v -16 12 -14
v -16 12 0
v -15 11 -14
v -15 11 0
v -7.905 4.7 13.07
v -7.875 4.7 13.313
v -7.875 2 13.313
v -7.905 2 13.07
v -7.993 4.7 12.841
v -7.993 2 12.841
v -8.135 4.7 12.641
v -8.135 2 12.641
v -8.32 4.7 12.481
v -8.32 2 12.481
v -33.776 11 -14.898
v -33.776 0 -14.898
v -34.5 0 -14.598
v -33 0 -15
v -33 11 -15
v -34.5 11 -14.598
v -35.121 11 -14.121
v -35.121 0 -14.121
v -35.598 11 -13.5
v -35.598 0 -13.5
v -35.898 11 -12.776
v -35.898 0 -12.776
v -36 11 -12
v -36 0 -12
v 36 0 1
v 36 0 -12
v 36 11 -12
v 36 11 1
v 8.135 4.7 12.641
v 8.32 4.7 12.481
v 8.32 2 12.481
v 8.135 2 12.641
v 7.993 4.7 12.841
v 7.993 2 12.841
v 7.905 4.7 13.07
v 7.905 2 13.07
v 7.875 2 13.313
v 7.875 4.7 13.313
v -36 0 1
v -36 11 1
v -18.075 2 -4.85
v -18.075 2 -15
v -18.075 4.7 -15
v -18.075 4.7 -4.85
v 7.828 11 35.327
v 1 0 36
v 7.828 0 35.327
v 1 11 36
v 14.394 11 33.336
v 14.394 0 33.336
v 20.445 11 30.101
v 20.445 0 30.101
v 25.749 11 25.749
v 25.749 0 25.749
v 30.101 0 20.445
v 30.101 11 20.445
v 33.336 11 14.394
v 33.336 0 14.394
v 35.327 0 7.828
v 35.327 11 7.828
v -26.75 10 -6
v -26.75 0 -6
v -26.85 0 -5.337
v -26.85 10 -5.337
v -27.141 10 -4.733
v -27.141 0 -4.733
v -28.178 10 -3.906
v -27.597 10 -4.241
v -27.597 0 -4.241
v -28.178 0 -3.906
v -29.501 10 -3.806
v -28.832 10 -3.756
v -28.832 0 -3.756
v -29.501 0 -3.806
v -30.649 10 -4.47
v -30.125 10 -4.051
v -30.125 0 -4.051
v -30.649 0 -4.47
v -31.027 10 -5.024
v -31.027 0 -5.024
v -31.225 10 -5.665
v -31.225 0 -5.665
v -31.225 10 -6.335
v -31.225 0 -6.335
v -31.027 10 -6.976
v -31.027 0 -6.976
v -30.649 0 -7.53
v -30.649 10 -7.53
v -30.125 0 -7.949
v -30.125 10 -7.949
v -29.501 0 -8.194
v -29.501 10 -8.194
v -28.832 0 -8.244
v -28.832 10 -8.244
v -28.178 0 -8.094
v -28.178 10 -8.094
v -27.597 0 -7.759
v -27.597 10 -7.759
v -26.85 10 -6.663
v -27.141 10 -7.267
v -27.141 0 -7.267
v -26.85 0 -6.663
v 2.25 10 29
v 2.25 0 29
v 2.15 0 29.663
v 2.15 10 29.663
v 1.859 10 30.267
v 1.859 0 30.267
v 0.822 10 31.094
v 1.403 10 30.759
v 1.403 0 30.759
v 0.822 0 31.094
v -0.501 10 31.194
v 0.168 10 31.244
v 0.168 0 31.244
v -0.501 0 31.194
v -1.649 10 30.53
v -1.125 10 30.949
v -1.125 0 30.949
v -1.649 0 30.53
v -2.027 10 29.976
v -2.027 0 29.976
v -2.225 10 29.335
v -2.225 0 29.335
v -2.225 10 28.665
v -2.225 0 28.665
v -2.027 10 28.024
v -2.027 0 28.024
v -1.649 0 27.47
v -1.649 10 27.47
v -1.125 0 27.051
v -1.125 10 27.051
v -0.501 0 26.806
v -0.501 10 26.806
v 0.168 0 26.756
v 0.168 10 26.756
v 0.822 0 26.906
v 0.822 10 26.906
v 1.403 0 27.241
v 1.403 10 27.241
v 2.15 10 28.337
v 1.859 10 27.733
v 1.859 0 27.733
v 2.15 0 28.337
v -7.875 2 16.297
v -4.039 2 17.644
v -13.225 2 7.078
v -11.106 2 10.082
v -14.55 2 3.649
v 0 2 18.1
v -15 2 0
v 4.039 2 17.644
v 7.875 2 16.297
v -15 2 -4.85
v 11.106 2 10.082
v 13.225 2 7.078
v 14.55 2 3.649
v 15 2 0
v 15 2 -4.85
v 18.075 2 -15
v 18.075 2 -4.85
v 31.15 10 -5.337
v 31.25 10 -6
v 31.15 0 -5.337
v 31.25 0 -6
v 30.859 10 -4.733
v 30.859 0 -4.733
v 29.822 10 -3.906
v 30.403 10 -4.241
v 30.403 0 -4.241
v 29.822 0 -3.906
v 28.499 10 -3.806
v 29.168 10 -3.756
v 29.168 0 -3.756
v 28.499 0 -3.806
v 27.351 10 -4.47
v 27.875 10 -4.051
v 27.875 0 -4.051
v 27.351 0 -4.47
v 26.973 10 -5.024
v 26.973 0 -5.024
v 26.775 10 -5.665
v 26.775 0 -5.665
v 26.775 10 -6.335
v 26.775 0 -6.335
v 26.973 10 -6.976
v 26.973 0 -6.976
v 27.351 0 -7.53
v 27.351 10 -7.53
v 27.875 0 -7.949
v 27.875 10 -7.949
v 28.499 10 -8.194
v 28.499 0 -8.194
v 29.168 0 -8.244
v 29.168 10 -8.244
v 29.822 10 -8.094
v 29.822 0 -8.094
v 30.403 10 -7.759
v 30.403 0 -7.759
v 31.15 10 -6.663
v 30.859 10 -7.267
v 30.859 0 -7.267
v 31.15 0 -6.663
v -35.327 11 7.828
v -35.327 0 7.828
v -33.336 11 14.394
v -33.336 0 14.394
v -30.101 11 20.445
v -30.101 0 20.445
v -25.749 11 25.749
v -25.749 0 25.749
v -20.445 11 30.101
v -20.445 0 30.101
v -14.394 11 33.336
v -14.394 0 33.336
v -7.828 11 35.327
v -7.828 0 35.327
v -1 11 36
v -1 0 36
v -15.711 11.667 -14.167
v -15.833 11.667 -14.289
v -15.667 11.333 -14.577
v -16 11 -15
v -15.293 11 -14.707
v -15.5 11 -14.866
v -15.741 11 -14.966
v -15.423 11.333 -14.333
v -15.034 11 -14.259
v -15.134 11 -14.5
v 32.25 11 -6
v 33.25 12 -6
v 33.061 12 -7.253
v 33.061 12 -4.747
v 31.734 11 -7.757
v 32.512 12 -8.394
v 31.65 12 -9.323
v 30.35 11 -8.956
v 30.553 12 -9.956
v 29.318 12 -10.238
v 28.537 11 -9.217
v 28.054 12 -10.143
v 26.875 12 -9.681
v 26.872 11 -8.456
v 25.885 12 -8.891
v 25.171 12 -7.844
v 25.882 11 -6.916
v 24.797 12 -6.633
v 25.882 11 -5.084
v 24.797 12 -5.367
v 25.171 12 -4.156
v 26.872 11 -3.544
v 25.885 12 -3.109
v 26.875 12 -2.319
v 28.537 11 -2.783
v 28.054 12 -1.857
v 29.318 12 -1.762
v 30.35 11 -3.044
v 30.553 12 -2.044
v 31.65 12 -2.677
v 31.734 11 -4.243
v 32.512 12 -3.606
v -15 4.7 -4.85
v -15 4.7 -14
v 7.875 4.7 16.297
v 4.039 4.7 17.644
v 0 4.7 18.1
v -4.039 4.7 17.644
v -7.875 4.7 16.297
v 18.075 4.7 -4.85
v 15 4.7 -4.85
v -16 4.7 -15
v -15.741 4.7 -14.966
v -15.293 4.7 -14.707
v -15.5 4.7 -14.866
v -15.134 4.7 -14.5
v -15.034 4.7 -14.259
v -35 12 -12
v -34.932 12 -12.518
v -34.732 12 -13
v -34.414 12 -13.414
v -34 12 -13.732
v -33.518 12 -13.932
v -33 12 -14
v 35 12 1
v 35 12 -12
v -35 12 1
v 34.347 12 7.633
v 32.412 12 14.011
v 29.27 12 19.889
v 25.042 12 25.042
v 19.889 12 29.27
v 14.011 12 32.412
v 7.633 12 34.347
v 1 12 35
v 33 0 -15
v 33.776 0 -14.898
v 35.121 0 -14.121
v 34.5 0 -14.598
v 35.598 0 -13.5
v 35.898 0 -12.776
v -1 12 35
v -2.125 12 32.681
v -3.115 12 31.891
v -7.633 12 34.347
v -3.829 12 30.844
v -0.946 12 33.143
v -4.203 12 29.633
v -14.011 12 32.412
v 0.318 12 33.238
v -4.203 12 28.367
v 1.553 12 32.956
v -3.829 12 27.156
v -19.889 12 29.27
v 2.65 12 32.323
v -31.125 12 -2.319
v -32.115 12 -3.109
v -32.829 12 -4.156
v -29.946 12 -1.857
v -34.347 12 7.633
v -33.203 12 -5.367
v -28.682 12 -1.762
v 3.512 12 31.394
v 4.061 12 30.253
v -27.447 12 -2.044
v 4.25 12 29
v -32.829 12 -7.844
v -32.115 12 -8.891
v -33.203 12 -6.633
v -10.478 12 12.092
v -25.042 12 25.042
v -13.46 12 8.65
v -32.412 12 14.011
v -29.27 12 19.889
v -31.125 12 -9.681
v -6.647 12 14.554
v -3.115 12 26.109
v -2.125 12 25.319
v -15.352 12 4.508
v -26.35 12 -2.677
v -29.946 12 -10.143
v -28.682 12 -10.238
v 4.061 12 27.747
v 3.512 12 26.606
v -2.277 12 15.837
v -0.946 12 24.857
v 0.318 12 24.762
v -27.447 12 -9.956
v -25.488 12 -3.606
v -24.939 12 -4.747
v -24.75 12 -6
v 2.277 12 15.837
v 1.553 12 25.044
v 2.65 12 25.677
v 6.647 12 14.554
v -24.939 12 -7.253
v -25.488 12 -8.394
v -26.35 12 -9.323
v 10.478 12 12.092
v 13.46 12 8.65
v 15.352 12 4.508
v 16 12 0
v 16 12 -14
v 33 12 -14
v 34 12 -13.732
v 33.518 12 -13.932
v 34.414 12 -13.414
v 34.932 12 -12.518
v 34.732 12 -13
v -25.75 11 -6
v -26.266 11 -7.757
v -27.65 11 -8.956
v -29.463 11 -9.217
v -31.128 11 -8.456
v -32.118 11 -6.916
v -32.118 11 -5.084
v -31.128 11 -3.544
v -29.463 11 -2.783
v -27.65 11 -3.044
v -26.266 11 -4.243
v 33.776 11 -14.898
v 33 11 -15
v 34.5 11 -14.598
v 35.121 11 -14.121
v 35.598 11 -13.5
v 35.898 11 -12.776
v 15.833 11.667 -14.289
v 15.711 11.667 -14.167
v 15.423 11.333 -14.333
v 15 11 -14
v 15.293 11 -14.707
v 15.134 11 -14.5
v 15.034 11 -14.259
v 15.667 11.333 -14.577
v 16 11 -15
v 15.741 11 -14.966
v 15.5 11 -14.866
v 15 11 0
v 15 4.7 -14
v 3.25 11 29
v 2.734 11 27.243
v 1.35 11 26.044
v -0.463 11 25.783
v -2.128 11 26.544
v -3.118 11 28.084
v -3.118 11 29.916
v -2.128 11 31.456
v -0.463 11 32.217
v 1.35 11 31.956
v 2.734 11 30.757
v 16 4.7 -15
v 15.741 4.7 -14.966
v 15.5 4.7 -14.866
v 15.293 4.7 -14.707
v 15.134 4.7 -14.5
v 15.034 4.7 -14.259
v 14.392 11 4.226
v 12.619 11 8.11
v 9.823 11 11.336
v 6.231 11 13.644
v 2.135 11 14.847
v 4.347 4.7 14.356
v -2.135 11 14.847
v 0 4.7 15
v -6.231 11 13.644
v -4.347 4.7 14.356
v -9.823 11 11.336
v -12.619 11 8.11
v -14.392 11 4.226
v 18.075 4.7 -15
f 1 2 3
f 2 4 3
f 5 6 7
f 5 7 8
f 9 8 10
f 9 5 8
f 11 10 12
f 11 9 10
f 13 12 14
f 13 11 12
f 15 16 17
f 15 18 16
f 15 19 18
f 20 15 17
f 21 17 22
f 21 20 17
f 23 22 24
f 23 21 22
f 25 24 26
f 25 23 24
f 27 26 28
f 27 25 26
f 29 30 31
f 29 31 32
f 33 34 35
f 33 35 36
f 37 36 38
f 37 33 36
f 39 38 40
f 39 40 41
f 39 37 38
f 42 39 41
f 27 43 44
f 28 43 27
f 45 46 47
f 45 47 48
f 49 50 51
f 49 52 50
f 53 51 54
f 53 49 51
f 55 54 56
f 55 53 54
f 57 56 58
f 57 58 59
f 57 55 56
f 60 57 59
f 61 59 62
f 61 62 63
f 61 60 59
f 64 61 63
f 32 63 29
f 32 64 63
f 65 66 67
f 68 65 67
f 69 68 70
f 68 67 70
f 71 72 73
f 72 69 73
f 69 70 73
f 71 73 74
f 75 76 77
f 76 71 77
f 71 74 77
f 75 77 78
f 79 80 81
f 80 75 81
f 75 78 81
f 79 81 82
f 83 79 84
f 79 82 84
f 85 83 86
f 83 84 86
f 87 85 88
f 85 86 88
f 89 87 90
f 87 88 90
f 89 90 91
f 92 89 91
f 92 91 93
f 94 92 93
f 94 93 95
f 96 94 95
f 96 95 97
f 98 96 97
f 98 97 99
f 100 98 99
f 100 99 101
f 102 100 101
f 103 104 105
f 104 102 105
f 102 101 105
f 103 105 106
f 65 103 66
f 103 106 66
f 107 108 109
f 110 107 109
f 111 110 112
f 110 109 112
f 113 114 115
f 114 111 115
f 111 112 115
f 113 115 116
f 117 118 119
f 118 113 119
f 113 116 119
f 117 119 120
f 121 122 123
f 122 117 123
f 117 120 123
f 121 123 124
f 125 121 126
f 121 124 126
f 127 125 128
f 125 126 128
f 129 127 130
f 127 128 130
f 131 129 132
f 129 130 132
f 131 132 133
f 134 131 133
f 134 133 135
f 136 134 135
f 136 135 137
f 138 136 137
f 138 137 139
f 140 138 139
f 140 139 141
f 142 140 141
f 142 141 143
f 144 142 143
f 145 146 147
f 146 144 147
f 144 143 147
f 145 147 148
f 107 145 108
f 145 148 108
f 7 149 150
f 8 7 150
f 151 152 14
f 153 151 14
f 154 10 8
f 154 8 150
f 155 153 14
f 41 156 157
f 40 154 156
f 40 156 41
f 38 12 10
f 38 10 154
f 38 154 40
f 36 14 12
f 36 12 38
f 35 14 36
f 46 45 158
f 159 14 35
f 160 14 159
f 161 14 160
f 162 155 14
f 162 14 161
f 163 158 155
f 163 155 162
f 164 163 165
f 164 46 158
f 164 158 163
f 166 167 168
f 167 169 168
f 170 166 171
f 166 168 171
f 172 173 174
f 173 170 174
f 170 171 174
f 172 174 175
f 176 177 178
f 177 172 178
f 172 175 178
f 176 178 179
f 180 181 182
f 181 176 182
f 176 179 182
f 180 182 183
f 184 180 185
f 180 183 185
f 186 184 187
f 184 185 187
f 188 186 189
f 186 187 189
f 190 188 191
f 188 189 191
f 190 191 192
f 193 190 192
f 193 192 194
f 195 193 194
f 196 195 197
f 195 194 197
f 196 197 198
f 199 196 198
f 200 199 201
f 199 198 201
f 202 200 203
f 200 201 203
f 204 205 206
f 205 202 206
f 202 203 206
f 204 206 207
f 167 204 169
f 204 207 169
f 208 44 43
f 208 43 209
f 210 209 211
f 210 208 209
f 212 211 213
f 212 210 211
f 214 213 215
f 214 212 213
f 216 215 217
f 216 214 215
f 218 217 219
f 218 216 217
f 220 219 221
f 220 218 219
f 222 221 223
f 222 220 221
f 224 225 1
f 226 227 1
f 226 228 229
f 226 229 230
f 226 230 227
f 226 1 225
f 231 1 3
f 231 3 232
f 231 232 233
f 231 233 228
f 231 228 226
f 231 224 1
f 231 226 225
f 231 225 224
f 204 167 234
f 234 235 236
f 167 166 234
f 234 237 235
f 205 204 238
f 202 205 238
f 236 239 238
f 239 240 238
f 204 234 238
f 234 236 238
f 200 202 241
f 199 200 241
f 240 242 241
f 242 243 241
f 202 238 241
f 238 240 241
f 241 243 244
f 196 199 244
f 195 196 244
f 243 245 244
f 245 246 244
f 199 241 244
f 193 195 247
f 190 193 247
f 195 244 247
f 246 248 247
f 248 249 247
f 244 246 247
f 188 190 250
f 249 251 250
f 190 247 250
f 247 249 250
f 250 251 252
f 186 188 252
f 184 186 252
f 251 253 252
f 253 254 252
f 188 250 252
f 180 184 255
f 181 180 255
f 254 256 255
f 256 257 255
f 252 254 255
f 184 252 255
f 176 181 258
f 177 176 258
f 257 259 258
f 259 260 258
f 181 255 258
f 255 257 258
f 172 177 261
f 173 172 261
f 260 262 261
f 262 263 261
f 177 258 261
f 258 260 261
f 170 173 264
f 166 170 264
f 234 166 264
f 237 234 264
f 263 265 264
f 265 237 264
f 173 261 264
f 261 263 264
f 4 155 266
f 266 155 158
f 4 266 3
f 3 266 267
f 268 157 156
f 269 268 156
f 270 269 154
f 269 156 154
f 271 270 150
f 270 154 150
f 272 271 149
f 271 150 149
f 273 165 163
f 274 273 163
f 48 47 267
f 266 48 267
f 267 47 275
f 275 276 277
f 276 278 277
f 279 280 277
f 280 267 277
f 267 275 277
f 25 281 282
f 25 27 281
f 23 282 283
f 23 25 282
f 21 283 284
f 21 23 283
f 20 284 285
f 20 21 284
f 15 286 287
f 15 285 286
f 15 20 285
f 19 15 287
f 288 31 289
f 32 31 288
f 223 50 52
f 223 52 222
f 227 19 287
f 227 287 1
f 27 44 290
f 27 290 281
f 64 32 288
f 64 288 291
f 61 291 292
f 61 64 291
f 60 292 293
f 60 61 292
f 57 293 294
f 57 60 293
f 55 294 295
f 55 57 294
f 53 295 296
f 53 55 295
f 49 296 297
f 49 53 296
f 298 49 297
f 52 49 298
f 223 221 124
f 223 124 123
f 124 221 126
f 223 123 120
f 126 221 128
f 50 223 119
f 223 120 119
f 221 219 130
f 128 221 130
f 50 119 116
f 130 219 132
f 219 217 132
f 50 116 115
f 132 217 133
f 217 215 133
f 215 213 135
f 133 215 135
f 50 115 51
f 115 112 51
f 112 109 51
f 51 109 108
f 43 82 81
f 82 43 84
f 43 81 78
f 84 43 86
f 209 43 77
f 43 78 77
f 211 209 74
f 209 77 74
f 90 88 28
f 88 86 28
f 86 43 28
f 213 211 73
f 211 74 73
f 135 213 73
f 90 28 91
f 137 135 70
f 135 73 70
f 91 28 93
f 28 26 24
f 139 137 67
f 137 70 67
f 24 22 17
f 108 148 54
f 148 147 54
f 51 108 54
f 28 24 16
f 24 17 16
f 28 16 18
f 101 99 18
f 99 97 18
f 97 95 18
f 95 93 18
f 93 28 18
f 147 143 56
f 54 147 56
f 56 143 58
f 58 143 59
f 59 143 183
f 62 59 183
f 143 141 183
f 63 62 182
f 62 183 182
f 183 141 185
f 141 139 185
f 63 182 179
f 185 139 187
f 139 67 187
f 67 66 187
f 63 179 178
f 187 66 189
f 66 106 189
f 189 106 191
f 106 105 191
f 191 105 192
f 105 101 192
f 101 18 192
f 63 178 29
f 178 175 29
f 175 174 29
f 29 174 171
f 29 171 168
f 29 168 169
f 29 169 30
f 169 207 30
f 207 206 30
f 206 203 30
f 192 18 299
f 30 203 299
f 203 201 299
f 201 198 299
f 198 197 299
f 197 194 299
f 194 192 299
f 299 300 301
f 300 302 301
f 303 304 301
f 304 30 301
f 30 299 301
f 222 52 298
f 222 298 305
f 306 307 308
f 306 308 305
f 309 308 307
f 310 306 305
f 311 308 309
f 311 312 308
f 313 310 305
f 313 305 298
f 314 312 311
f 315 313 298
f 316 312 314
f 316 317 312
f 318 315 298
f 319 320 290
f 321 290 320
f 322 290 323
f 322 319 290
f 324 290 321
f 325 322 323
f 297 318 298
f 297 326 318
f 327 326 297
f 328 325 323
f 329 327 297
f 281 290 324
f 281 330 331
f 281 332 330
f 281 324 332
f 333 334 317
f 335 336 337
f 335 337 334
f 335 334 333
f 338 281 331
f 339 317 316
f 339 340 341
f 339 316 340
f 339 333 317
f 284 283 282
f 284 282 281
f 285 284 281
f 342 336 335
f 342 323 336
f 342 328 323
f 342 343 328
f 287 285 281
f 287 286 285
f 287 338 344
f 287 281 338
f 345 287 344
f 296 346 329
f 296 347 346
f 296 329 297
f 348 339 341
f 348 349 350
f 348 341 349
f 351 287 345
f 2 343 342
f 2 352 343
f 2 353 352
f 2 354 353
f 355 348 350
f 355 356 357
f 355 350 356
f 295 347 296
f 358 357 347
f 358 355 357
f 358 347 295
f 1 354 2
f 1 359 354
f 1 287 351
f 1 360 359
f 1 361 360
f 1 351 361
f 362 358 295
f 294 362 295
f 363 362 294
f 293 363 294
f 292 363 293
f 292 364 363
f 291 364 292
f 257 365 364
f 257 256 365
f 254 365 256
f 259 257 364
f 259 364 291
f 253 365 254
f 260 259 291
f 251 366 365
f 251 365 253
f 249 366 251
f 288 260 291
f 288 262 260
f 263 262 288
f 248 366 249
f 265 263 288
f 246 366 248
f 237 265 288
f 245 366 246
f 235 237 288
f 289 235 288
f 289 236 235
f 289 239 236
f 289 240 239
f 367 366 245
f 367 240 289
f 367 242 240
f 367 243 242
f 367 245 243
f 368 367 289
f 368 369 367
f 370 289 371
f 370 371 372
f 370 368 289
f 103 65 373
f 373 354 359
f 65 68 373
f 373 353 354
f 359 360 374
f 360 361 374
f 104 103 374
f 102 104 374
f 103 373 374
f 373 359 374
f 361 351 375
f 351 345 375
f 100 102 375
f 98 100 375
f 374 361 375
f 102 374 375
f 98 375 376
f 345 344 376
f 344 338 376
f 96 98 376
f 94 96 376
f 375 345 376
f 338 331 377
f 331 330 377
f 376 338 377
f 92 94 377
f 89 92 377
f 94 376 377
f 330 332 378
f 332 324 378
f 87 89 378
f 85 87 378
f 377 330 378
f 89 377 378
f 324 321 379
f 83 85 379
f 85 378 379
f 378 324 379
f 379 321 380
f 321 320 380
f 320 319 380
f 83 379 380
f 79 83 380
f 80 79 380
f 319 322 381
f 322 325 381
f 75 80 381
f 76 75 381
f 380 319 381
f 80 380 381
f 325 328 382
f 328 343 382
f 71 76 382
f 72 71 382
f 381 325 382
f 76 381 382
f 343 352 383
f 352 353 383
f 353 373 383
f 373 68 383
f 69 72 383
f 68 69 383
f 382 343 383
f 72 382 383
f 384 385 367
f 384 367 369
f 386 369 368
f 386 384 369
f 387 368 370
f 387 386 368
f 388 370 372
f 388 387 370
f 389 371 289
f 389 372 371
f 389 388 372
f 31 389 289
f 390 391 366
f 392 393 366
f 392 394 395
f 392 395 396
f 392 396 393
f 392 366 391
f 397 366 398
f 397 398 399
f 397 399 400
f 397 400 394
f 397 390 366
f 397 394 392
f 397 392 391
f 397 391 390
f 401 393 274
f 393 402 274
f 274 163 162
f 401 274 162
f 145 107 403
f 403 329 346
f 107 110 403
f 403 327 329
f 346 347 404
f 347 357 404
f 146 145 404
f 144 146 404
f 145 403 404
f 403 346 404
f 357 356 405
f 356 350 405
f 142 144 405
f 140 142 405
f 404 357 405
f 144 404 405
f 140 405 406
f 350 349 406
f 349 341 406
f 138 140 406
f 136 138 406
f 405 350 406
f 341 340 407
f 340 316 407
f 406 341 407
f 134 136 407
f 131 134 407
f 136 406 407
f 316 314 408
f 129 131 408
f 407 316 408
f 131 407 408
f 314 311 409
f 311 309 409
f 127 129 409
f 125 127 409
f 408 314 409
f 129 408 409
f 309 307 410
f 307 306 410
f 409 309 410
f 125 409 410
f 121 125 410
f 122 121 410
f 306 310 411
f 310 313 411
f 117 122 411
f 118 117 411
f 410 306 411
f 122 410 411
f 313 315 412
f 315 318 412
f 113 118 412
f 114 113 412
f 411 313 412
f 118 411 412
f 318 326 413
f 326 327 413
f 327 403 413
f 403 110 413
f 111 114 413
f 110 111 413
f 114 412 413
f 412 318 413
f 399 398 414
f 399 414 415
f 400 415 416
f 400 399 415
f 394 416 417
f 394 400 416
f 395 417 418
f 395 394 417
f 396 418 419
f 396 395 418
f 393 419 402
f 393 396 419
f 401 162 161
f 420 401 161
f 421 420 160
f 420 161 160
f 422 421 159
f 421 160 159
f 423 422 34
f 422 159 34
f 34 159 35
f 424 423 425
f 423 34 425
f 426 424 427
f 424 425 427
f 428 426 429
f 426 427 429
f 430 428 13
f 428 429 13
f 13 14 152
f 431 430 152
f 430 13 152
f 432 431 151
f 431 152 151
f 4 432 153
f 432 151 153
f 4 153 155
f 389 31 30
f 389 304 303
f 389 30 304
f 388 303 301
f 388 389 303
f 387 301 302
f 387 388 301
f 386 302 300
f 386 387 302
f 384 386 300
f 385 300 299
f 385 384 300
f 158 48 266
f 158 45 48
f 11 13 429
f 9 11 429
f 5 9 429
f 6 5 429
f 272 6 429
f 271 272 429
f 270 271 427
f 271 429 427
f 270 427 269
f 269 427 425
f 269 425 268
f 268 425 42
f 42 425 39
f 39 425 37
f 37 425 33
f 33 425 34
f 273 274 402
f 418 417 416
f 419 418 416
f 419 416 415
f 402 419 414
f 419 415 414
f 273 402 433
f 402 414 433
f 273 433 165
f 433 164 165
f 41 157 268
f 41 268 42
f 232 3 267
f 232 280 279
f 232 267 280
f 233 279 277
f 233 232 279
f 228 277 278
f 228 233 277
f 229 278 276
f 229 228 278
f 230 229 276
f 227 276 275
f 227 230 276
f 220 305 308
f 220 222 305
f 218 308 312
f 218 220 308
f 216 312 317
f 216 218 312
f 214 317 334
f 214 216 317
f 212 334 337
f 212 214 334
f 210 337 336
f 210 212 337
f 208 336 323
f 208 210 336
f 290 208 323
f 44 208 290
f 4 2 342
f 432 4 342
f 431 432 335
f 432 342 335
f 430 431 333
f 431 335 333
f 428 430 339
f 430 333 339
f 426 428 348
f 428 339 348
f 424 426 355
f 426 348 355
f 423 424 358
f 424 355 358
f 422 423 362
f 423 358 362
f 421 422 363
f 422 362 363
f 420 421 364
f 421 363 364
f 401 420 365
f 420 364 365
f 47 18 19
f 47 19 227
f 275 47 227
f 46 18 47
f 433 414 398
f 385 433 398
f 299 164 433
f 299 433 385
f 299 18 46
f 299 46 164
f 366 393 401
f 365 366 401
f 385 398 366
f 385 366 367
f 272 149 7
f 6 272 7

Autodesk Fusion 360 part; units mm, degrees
sketch "Sketch1" plane through (0, 0, 0) normal (0, 1, 0) x (1, 0, 0)
  circle A0 centre (0, 0) radius 15
  line L0 (-15, 0) -> (-15, 15)
  line L1 (-15, 15) -> (15, 15)
  line L2 (15, 15) -> (15, 0)
  line L3 (-15, 15) -> (-18.075, 15)
  line L4 (-18.075, 15) -> (-18.075, 4.85)
  line L5 (-18.075, 4.85) -> (-15, 4.85)
  line L6 (15, 15) -> (18.075, 15)
  line L7 (18.075, 15) -> (18.075, 4.85)
  line L8 (18.075, 4.85) -> (14.975, 4.85)
  line L9 (-7.875, -16.2971) -> (-7.875, -12.7665)
  line L10 (7.875, -16.2971) -> (7.875, -12.7665)
  line L11 (-7.875, -12.7665) -> (-7.875, -16.2971)
  line L12 (7.875, -12.7665) -> (7.875, -16.2971)
  arc A1 (-7.875, -16.2971) -> (7.875, -16.2971) centre (0, 0) ccw
  circle A2 centre (0, 0) radius 22
  line L13 (-22, 0) -> (-22, 22)
  line L14 (-22, 22) -> (22, 22)
  line L15 (22, 22) -> (22, 0)
  line L16 (-18.075, 15) -> (-22, 15)
  line L17 (18.075, 15) -> (22, 15)
  point P0 (0, -18.1)
  dimension "d1" = 30
  dimension "d3" = 10.15
  dimension "d5" = 15.75
  dimension "d6" = 36.15
  dimension "d7" = 18.1
  dimension "d8" = 7
  dimension "d9" = -7
extrude "Extrude1" add sketch "Sketch1" along normal blind 12 contours A0 L0 L2 L4 L5 L7 L8 L9 L10 L11 L12 A1 A2 | A0 L9 L10 L11 L12 A1 | L0 L3 L4 L5 A2 | L2 L6 L7 L8 A2 | L3 L4 A2 | L6 L7 A2 | L4 A2 L13 L16 | L7 A2 L15 L17
extrude "Extrude2" add sketch "Sketch1" along normal blind 2 contours A0 | A0 L0 L1 | A0 L1 L2
extrude "Extrude3" cut sketch "Sketch1" along normal blind 2.7 from surface at 2 contours A0 L9 L10 L11 L12 A1 | L0 L3 L4 L5 A2 | L2 L6 L7 L8 A2 | L3 L4 A2 | L6 L7 A2
sketch "Sketch2" plane through (0, 0, 0) normal (0, 1, 0) x (1, 0, 0)
  line L0 (-36, 15) -> (36, 15)
  line L1 (36, 15) -> (36, -36)
  line L2 (36, -36) -> (-36, -36)
  line L3 (-36, -36) -> (-36, 15)
  line L4 (-22, 15) -> (-22, 0)
  arc A0 (-22, 0) -> (22, 0) centre (0, 0) ccw
  line L5 (-15, 15) -> (-22, 15)
  circle A1 centre (-29, 6) radius 2.25
  circle A2 centre (29, 6) radius 2.25
  circle A3 centre (0, -29) radius 2.25
  line L6 (0, -22) -> (0, -36) construction
  line L7 (-22, 15) -> (-36, 15) construction
  line L8 (36, 15) -> (22, 15) construction
  line L9 (22, 15) -> (22, 0)
  point P0 (0, -36)
  point P1 (0, -22)
  point P2 (0, -29)
  point P3 (22, 15)
  point P4 (-29, 15)
  point P5 (29, 15)
  dimension "d17" = 14
  dimension "d18" = 14
  dimension "d19" = 9
  dimension "d20" = 4.5
extrude "Extrude4" add sketch "Sketch2" along normal up to surface (12 mm away) contours L0 L1 L2 L3 L4 A0 L9
chamfer "Chamfer1" distance 2 angle 45 3 edges at (-31.0977, 12, -5.1864) (26.9023, 12, -5.1864) (-2.0977, 12, 29.8136)
fillet "Fillet1" radius 35 2 edges at (-36, 6, 36) (36, 6, 36)
fillet "Fillet2" radius 3 2 edges at (36, 6, -15) (-36, 6, -15)
fillet "Fillet3" radius 1 4 edges at (-15, 8.35, -15) (15, 8.35, -15) (-7.875, 3.35, 12.7665) (7.875, 3.35, 12.7665)
chamfer "Chamfer2" distance 1 angle 45 14 edges at (-25.7487, 12, 25.7487) (-36, 12, -5.5) (-35.1213, 12, -14.1213) (-24.5, 12, -15) (-15.2929, 12, -14.7071) (-15, 12, -7) (0, 12, 15) (15, 12, -7) (15.2929, 12, -14.7071) (24.5, 12, -15) (35.1213, 12, -14.1213) (36, 12, -5.5) (25.7487, 12, 25.7487) (0, 12, 36)
equation "d7 = d1 / 2 + 3.1 mm"
equation "d15 = 2.5 mm + 0.2 mm"
equation "d18 = d17"
